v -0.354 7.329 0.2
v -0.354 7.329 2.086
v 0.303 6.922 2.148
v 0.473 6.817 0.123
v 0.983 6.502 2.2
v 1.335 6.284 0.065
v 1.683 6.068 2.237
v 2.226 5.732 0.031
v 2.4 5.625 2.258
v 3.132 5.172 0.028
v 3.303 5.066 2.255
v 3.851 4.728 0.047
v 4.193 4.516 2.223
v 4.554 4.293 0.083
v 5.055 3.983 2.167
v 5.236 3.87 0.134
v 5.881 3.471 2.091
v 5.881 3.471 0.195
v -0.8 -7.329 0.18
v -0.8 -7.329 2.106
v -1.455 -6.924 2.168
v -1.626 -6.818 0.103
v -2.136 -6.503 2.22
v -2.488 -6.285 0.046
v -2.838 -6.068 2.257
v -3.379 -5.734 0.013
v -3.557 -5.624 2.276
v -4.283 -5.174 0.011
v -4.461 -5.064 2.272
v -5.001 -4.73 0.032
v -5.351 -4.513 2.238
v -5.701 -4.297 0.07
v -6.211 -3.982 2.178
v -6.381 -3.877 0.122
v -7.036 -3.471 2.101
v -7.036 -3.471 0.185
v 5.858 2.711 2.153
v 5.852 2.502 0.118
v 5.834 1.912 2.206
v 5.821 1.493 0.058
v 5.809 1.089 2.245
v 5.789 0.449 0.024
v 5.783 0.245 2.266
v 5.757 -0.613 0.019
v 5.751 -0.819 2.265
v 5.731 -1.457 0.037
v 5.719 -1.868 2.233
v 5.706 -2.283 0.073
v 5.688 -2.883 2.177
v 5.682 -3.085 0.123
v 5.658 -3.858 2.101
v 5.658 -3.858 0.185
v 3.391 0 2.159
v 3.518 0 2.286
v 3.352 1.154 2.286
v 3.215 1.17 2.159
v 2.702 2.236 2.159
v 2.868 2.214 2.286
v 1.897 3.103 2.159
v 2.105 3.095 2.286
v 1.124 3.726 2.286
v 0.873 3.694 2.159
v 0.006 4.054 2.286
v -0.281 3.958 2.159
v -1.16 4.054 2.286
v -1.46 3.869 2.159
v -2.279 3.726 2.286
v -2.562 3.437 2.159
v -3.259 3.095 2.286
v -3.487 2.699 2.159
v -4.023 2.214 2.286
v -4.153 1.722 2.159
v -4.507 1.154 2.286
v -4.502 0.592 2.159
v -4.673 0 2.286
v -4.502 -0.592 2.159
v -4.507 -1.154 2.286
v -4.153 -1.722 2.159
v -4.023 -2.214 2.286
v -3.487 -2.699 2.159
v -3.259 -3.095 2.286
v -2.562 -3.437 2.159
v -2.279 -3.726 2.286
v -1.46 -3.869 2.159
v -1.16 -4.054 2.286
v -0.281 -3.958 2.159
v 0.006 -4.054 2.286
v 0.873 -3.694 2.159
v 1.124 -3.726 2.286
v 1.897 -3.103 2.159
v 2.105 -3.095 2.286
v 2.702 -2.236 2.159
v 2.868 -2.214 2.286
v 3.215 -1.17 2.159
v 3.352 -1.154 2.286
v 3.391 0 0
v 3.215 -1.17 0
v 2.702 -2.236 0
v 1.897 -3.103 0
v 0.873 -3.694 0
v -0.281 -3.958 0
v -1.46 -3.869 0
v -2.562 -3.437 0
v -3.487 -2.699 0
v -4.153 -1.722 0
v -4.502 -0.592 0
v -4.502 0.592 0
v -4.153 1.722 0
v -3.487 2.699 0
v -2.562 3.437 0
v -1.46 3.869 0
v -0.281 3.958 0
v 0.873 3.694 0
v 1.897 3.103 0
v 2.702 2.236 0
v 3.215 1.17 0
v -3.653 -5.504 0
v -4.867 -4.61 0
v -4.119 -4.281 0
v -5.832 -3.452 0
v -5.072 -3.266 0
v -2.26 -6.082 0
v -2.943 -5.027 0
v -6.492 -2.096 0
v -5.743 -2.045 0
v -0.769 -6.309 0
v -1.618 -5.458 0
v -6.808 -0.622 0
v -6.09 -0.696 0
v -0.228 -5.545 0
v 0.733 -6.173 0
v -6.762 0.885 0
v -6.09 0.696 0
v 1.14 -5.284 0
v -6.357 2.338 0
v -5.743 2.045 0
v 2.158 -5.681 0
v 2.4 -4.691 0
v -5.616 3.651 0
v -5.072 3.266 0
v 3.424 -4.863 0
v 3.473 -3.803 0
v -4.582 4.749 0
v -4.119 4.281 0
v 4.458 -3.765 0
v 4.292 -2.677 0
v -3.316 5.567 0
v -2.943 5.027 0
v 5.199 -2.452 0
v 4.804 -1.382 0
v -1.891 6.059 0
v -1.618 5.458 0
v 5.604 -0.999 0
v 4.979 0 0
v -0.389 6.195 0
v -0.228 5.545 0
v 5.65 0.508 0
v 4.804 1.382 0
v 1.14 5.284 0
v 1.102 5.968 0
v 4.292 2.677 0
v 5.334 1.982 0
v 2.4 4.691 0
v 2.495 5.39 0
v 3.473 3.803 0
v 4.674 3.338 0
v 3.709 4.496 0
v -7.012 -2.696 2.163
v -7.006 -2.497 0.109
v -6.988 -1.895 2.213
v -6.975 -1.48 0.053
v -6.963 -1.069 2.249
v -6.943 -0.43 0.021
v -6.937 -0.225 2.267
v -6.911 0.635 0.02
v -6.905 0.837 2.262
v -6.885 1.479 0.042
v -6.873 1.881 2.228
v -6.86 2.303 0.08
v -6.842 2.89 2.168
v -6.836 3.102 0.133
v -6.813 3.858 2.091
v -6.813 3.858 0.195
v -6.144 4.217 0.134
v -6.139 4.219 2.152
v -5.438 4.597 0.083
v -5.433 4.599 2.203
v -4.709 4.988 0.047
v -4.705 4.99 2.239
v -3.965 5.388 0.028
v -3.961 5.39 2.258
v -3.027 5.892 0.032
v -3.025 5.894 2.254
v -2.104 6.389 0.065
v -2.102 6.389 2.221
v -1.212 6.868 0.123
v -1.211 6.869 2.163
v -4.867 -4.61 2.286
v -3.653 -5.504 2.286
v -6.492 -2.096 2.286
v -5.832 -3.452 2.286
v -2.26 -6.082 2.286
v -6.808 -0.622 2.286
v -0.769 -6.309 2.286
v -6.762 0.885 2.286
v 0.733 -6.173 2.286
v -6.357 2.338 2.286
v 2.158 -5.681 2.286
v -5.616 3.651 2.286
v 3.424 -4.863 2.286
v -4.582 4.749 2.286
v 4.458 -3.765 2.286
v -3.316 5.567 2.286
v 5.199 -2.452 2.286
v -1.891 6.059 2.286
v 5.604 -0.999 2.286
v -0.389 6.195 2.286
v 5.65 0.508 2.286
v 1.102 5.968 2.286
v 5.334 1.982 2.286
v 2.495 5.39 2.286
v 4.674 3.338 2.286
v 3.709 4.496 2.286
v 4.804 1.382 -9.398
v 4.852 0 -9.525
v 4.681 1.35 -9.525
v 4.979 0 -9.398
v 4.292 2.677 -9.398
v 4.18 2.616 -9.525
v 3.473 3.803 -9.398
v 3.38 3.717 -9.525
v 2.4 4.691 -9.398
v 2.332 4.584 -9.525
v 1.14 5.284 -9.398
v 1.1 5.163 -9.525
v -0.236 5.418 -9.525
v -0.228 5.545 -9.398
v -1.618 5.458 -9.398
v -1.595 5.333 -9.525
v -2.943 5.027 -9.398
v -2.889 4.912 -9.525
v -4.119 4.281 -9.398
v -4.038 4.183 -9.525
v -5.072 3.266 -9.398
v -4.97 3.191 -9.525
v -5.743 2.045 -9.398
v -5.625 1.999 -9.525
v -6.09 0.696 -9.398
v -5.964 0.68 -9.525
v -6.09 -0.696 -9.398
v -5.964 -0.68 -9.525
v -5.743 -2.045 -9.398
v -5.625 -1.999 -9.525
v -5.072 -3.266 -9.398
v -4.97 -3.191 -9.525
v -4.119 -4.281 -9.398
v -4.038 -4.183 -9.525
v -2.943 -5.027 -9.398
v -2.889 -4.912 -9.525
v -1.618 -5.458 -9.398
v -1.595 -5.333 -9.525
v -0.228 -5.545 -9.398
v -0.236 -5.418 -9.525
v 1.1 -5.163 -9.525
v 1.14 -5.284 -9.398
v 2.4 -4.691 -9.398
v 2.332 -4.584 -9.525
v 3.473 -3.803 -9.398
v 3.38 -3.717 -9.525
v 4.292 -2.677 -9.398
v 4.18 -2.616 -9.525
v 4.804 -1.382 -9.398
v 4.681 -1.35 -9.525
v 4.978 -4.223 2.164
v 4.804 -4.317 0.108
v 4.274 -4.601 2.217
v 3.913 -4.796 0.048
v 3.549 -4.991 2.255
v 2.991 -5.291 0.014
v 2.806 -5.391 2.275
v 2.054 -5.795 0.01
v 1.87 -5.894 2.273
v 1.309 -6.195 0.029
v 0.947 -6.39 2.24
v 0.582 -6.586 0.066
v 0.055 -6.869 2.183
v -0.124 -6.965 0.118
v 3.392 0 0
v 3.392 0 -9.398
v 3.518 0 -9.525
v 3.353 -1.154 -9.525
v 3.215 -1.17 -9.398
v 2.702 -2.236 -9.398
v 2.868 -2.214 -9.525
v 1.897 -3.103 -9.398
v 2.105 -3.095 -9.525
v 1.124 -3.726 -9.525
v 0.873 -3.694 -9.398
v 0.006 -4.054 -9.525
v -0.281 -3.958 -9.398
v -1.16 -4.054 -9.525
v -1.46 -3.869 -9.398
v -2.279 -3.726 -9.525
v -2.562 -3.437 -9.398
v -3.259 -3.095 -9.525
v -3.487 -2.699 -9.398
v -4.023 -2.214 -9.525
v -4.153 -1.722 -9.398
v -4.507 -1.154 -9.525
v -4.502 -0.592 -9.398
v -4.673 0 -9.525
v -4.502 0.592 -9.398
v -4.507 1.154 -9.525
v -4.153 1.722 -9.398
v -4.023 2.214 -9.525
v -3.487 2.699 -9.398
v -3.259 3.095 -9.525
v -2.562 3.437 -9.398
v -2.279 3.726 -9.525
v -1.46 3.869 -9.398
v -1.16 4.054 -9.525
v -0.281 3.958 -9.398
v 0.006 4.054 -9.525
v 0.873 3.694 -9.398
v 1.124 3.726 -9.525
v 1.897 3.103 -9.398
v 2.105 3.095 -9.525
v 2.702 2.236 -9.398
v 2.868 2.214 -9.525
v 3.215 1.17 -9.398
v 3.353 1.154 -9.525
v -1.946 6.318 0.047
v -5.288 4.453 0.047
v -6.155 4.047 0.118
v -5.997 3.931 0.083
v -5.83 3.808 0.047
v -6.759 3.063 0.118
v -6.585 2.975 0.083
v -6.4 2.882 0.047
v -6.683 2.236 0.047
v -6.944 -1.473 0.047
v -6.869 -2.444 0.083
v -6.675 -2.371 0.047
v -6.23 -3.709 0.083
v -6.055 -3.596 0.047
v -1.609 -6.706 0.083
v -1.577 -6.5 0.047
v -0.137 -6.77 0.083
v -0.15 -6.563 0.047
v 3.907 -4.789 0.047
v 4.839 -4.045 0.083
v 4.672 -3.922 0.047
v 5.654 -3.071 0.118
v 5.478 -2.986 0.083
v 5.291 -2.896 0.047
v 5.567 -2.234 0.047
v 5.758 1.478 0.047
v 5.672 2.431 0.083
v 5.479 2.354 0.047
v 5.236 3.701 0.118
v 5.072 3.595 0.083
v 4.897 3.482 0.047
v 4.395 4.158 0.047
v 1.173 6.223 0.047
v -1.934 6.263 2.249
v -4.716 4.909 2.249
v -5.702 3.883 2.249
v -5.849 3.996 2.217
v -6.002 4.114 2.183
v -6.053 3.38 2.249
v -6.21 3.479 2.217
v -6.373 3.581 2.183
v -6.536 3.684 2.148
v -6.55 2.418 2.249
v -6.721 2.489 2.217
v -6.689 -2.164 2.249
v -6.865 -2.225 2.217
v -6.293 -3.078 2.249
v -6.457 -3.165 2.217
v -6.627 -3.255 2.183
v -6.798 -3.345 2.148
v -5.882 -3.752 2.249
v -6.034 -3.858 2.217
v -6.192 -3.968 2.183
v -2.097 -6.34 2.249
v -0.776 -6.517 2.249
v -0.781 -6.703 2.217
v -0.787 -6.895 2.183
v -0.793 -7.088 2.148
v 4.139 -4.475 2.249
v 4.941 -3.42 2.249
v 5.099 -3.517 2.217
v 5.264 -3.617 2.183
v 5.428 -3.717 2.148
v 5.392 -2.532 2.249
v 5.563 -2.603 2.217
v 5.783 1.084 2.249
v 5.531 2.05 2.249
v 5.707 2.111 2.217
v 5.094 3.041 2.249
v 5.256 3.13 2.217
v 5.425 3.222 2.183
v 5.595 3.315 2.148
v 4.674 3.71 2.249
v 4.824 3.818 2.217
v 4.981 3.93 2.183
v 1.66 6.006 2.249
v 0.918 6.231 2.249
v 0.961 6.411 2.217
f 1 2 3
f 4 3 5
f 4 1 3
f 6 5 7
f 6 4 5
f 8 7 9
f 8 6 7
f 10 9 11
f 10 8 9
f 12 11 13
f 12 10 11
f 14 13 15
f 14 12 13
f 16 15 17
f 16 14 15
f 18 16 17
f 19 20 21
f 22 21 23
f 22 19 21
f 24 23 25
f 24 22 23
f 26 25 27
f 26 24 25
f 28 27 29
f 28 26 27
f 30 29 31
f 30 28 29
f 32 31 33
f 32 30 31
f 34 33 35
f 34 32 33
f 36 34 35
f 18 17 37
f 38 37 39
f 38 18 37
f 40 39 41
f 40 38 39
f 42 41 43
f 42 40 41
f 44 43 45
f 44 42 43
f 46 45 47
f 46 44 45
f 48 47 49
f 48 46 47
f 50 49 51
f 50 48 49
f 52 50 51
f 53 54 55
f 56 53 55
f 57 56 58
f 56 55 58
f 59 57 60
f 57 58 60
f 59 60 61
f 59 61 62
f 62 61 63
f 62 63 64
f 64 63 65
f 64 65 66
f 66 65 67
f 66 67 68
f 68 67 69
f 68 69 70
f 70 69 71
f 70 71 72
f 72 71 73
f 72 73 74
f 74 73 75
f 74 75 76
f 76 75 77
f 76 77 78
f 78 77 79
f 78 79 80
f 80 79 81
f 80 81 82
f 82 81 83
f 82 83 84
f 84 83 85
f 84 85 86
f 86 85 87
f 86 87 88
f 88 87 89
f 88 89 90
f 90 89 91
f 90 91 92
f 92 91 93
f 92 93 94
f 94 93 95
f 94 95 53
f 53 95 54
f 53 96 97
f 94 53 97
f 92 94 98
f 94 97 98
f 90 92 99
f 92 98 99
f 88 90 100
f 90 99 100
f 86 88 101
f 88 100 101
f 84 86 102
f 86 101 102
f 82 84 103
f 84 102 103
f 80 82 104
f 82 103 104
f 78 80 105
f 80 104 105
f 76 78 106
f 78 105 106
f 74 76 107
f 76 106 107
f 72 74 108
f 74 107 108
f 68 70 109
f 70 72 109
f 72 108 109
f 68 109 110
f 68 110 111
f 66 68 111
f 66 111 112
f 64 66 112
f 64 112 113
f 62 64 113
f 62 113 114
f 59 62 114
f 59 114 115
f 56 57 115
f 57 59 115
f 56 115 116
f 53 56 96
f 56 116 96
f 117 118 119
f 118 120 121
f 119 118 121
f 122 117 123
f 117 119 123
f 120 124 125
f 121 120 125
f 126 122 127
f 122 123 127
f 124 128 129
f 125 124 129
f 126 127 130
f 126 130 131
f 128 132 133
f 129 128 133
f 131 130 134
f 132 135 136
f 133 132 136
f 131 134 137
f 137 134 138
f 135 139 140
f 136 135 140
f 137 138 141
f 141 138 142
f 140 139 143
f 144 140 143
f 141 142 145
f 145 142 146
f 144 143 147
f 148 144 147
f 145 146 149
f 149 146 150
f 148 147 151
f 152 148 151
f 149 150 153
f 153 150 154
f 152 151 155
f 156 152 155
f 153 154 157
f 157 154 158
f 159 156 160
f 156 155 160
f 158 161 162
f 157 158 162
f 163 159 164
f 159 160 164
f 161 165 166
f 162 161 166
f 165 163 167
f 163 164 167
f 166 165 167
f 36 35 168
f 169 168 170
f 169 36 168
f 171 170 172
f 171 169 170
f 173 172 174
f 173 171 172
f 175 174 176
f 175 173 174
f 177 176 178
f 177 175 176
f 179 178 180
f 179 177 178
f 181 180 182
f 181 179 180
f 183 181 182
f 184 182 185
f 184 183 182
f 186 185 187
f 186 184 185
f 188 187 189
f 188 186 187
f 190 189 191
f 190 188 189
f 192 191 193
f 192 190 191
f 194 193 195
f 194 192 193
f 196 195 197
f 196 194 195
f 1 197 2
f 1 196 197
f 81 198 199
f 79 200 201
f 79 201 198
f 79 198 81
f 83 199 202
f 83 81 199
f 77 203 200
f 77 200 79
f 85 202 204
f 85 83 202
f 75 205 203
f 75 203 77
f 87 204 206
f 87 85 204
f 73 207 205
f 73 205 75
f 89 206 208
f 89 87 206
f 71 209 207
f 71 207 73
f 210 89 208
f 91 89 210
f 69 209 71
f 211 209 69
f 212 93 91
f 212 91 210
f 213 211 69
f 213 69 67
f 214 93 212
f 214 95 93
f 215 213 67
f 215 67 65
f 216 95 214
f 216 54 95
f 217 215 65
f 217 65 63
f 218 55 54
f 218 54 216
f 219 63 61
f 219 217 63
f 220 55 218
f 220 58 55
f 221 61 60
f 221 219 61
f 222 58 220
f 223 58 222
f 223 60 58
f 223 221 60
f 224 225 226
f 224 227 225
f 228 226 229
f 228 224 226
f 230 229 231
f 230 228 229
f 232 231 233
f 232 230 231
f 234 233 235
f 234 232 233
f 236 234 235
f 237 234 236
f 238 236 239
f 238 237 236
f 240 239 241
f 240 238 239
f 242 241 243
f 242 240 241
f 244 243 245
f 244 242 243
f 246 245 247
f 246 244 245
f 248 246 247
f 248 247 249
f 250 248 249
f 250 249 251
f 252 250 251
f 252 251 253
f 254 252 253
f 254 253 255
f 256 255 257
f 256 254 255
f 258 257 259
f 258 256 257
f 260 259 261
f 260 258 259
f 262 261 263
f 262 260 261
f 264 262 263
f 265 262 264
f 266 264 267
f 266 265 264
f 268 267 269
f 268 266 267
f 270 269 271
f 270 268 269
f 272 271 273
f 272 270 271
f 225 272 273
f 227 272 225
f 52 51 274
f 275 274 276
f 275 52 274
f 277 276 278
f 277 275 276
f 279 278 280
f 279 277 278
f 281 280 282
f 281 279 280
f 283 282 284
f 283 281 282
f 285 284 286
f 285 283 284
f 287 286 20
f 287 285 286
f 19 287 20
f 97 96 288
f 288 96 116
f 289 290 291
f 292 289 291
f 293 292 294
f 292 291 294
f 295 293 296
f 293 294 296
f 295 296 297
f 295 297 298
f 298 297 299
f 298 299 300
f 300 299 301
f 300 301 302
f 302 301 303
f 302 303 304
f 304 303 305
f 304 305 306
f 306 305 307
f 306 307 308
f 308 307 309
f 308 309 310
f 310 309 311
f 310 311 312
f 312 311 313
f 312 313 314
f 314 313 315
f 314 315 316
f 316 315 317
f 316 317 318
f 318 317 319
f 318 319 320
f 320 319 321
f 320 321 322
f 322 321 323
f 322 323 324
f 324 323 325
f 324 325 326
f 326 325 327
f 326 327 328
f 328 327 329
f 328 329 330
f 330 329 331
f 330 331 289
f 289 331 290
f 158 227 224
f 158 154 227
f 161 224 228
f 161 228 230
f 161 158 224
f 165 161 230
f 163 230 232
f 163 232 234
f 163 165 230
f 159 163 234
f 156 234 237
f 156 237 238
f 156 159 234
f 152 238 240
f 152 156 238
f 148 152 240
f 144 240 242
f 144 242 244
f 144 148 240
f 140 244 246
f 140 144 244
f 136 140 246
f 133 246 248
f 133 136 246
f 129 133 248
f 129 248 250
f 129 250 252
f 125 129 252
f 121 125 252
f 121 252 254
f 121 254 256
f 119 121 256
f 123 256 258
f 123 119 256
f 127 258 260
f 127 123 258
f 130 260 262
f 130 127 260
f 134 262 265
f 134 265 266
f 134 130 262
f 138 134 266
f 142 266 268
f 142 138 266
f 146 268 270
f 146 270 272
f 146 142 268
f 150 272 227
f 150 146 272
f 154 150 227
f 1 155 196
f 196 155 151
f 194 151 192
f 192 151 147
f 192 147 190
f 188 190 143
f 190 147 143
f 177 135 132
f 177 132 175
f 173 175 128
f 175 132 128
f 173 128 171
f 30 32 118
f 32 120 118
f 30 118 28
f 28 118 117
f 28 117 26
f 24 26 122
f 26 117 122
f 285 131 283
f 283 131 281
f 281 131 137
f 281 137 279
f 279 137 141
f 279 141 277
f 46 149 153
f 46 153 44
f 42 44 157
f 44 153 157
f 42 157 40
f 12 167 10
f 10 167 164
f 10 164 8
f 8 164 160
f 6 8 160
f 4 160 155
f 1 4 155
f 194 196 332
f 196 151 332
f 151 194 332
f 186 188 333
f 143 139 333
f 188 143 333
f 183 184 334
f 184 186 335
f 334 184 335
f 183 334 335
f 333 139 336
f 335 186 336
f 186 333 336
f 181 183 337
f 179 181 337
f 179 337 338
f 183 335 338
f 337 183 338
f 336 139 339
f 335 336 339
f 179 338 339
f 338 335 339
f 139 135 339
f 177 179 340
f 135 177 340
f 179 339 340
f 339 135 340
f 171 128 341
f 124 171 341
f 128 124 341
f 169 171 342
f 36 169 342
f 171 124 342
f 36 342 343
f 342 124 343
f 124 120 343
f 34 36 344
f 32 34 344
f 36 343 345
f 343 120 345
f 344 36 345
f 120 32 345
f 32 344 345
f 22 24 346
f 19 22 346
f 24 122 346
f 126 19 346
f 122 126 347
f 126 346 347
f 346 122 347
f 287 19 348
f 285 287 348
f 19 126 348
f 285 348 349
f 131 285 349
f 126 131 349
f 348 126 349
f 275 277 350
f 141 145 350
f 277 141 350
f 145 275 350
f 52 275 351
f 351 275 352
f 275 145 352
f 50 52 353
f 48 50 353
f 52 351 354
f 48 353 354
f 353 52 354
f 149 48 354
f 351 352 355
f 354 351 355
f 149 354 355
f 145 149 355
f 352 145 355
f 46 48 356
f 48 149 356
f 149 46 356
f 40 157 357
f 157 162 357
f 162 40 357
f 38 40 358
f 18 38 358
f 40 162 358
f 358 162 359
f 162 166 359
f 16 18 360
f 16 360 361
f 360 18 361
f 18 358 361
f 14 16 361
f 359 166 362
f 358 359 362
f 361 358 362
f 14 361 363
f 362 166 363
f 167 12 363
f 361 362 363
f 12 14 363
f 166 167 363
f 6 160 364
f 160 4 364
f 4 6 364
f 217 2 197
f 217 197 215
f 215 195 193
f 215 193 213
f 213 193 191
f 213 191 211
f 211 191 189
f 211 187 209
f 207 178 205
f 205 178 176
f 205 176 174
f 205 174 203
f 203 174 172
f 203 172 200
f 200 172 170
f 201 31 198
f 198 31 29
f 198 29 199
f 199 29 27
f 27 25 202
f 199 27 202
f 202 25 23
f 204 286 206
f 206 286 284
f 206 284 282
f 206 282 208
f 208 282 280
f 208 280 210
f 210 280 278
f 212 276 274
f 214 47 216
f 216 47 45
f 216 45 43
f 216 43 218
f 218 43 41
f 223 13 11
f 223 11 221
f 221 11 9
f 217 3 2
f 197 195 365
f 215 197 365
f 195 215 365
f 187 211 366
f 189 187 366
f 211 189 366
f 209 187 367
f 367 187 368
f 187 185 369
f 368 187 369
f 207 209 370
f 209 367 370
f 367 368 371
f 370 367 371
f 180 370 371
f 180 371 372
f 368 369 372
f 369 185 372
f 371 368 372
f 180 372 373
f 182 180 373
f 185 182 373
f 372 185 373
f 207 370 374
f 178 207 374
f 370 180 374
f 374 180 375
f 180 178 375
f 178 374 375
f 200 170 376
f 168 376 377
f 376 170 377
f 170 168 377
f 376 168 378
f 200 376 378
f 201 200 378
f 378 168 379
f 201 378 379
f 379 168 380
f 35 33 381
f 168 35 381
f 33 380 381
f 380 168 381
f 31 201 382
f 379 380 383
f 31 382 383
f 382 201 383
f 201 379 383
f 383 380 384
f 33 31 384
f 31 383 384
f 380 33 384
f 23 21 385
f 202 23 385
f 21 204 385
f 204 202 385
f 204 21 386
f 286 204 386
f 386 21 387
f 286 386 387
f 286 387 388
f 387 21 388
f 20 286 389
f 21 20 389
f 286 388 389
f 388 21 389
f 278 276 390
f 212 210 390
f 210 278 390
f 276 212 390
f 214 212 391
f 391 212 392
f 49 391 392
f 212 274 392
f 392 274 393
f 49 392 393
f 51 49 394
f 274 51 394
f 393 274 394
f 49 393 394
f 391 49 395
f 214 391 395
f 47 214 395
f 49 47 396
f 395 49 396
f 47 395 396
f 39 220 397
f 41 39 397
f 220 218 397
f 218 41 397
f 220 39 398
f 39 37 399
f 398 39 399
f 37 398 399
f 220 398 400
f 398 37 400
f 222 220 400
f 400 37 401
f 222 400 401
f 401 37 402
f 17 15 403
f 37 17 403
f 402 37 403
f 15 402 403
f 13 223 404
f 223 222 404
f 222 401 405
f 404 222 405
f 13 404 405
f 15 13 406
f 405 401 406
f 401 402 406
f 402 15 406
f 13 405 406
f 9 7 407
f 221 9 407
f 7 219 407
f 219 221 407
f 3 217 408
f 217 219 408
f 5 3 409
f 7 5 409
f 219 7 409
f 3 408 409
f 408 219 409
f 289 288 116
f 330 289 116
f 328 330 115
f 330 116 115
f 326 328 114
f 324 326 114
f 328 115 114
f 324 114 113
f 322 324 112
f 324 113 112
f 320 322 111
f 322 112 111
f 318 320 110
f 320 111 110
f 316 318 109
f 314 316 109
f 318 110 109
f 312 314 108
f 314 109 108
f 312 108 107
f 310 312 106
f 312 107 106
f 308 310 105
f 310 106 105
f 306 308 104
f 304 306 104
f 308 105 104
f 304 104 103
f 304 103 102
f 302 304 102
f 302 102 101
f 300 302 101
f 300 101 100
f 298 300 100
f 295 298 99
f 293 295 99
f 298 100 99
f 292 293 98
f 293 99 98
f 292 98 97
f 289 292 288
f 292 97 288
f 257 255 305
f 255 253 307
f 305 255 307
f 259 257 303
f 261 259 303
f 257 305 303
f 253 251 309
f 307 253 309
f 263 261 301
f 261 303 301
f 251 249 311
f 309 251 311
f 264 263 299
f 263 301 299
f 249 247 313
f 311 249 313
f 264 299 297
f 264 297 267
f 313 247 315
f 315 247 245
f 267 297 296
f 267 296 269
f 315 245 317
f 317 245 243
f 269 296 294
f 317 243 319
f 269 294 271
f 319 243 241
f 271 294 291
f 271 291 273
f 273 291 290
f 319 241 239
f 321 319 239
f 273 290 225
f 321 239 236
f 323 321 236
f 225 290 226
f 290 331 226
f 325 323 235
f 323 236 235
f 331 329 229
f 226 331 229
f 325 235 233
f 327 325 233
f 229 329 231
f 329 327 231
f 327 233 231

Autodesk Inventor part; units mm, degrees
ref_plane "YZ Plane" through (0, 0, 0) normal (1, 0, 0) x (0, 1, 0)
ref_plane "Work Plane1" through (0, 0, 0) normal (0, 0, 1) x (1, 0, 0)
sketch "Sketch2" plane through (0, 0, 0) normal (0, 0, 1) x (1, 0, 0)
  circle A0 centre (-0.5773, 0) radius 5.5562 projected
  circle A1 centre (-0.5773, 0) radius 3.9688
  dimension "d2" = 7.9375
extrude "Extrusion1" add sketch "Sketch2" against normal blind 9.525
sketch "Sketch3" plane through (-0.5773, 0, 0) normal (0, 0, 1) x (1, 0, 0)
  line L0 (6.4585, 3.4714) -> (6.2356, -3.8575)
  line L1 (6.2356, -3.8575) -> (-0.2229, -7.329)
  line L2 (-0.2229, -7.329) -> (-6.4585, -3.4714)
  line L3 (-6.4585, -3.4714) -> (-6.2356, 3.8575)
  line L4 (-6.2356, 3.8575) -> (0.2229, 7.329)
  line L5 (0.2229, 7.329) -> (6.4585, 3.4714)
  circle A0 centre (0, 0) radius 3.9687 projected
  dimension "d5" = 12.7
extrude "Extrusion2" add sketch "Sketch3" along normal blind 2.286
chamfer "Chamfer1" distance 0.127 angle 45 3 edges at (-6.1335, 0, -9.525) (-4.546, 0, -9.525) (-4.546, 0, 2.286)
ref_plane "Work Plane2" through (-0.6887, -3.6645, 2.286) normal (0.9995, -0.0304, 0) x (0, 0, -1)
sketch "Sketch4" plane through (-0.6887, -3.6645, 2.286) normal (0.9995, -0.0304, 0) x (0, 0, -1)
  line L0 (0.127, 7.5779) -> (11.684, 7.5779) construction
  line L1 (0.0196, 8.031) -> (-0.0196, 11.6969) construction
  line L2 (2.286, 8.0308) -> (2.286, 11.697) construction
  line L3 (0, 9.8639) -> (0.6953, 13.8073)
  line L4 (0.6953, 13.8073) -> (0, 13.8073)
  line L5 (0, 13.8073) -> (0, 9.8639)
  line L6 (2.286, 9.8639) -> (2.286, 13.8395)
  line L7 (2.286, 13.8395) -> (1.585, 13.8395)
  line L8 (1.585, 13.8395) -> (2.286, 9.8639)
  line L9 (13.9688, 3.6092) -> (-4.4249, 3.6092)
  dimension "d11" = 10
  dimension "d12" = 2.286
  dimension "d13" = 10
  dimension "d14" = 2.286
  dimension "d15" = 3.9688
revolve "Revolution1" cut sketch "Sketch4" angle 360 about axis through (-0.579, -0.057, -11.6828) along (0, 0, 1)
properties part number "hex sleeve" material "Stainless Steel"
